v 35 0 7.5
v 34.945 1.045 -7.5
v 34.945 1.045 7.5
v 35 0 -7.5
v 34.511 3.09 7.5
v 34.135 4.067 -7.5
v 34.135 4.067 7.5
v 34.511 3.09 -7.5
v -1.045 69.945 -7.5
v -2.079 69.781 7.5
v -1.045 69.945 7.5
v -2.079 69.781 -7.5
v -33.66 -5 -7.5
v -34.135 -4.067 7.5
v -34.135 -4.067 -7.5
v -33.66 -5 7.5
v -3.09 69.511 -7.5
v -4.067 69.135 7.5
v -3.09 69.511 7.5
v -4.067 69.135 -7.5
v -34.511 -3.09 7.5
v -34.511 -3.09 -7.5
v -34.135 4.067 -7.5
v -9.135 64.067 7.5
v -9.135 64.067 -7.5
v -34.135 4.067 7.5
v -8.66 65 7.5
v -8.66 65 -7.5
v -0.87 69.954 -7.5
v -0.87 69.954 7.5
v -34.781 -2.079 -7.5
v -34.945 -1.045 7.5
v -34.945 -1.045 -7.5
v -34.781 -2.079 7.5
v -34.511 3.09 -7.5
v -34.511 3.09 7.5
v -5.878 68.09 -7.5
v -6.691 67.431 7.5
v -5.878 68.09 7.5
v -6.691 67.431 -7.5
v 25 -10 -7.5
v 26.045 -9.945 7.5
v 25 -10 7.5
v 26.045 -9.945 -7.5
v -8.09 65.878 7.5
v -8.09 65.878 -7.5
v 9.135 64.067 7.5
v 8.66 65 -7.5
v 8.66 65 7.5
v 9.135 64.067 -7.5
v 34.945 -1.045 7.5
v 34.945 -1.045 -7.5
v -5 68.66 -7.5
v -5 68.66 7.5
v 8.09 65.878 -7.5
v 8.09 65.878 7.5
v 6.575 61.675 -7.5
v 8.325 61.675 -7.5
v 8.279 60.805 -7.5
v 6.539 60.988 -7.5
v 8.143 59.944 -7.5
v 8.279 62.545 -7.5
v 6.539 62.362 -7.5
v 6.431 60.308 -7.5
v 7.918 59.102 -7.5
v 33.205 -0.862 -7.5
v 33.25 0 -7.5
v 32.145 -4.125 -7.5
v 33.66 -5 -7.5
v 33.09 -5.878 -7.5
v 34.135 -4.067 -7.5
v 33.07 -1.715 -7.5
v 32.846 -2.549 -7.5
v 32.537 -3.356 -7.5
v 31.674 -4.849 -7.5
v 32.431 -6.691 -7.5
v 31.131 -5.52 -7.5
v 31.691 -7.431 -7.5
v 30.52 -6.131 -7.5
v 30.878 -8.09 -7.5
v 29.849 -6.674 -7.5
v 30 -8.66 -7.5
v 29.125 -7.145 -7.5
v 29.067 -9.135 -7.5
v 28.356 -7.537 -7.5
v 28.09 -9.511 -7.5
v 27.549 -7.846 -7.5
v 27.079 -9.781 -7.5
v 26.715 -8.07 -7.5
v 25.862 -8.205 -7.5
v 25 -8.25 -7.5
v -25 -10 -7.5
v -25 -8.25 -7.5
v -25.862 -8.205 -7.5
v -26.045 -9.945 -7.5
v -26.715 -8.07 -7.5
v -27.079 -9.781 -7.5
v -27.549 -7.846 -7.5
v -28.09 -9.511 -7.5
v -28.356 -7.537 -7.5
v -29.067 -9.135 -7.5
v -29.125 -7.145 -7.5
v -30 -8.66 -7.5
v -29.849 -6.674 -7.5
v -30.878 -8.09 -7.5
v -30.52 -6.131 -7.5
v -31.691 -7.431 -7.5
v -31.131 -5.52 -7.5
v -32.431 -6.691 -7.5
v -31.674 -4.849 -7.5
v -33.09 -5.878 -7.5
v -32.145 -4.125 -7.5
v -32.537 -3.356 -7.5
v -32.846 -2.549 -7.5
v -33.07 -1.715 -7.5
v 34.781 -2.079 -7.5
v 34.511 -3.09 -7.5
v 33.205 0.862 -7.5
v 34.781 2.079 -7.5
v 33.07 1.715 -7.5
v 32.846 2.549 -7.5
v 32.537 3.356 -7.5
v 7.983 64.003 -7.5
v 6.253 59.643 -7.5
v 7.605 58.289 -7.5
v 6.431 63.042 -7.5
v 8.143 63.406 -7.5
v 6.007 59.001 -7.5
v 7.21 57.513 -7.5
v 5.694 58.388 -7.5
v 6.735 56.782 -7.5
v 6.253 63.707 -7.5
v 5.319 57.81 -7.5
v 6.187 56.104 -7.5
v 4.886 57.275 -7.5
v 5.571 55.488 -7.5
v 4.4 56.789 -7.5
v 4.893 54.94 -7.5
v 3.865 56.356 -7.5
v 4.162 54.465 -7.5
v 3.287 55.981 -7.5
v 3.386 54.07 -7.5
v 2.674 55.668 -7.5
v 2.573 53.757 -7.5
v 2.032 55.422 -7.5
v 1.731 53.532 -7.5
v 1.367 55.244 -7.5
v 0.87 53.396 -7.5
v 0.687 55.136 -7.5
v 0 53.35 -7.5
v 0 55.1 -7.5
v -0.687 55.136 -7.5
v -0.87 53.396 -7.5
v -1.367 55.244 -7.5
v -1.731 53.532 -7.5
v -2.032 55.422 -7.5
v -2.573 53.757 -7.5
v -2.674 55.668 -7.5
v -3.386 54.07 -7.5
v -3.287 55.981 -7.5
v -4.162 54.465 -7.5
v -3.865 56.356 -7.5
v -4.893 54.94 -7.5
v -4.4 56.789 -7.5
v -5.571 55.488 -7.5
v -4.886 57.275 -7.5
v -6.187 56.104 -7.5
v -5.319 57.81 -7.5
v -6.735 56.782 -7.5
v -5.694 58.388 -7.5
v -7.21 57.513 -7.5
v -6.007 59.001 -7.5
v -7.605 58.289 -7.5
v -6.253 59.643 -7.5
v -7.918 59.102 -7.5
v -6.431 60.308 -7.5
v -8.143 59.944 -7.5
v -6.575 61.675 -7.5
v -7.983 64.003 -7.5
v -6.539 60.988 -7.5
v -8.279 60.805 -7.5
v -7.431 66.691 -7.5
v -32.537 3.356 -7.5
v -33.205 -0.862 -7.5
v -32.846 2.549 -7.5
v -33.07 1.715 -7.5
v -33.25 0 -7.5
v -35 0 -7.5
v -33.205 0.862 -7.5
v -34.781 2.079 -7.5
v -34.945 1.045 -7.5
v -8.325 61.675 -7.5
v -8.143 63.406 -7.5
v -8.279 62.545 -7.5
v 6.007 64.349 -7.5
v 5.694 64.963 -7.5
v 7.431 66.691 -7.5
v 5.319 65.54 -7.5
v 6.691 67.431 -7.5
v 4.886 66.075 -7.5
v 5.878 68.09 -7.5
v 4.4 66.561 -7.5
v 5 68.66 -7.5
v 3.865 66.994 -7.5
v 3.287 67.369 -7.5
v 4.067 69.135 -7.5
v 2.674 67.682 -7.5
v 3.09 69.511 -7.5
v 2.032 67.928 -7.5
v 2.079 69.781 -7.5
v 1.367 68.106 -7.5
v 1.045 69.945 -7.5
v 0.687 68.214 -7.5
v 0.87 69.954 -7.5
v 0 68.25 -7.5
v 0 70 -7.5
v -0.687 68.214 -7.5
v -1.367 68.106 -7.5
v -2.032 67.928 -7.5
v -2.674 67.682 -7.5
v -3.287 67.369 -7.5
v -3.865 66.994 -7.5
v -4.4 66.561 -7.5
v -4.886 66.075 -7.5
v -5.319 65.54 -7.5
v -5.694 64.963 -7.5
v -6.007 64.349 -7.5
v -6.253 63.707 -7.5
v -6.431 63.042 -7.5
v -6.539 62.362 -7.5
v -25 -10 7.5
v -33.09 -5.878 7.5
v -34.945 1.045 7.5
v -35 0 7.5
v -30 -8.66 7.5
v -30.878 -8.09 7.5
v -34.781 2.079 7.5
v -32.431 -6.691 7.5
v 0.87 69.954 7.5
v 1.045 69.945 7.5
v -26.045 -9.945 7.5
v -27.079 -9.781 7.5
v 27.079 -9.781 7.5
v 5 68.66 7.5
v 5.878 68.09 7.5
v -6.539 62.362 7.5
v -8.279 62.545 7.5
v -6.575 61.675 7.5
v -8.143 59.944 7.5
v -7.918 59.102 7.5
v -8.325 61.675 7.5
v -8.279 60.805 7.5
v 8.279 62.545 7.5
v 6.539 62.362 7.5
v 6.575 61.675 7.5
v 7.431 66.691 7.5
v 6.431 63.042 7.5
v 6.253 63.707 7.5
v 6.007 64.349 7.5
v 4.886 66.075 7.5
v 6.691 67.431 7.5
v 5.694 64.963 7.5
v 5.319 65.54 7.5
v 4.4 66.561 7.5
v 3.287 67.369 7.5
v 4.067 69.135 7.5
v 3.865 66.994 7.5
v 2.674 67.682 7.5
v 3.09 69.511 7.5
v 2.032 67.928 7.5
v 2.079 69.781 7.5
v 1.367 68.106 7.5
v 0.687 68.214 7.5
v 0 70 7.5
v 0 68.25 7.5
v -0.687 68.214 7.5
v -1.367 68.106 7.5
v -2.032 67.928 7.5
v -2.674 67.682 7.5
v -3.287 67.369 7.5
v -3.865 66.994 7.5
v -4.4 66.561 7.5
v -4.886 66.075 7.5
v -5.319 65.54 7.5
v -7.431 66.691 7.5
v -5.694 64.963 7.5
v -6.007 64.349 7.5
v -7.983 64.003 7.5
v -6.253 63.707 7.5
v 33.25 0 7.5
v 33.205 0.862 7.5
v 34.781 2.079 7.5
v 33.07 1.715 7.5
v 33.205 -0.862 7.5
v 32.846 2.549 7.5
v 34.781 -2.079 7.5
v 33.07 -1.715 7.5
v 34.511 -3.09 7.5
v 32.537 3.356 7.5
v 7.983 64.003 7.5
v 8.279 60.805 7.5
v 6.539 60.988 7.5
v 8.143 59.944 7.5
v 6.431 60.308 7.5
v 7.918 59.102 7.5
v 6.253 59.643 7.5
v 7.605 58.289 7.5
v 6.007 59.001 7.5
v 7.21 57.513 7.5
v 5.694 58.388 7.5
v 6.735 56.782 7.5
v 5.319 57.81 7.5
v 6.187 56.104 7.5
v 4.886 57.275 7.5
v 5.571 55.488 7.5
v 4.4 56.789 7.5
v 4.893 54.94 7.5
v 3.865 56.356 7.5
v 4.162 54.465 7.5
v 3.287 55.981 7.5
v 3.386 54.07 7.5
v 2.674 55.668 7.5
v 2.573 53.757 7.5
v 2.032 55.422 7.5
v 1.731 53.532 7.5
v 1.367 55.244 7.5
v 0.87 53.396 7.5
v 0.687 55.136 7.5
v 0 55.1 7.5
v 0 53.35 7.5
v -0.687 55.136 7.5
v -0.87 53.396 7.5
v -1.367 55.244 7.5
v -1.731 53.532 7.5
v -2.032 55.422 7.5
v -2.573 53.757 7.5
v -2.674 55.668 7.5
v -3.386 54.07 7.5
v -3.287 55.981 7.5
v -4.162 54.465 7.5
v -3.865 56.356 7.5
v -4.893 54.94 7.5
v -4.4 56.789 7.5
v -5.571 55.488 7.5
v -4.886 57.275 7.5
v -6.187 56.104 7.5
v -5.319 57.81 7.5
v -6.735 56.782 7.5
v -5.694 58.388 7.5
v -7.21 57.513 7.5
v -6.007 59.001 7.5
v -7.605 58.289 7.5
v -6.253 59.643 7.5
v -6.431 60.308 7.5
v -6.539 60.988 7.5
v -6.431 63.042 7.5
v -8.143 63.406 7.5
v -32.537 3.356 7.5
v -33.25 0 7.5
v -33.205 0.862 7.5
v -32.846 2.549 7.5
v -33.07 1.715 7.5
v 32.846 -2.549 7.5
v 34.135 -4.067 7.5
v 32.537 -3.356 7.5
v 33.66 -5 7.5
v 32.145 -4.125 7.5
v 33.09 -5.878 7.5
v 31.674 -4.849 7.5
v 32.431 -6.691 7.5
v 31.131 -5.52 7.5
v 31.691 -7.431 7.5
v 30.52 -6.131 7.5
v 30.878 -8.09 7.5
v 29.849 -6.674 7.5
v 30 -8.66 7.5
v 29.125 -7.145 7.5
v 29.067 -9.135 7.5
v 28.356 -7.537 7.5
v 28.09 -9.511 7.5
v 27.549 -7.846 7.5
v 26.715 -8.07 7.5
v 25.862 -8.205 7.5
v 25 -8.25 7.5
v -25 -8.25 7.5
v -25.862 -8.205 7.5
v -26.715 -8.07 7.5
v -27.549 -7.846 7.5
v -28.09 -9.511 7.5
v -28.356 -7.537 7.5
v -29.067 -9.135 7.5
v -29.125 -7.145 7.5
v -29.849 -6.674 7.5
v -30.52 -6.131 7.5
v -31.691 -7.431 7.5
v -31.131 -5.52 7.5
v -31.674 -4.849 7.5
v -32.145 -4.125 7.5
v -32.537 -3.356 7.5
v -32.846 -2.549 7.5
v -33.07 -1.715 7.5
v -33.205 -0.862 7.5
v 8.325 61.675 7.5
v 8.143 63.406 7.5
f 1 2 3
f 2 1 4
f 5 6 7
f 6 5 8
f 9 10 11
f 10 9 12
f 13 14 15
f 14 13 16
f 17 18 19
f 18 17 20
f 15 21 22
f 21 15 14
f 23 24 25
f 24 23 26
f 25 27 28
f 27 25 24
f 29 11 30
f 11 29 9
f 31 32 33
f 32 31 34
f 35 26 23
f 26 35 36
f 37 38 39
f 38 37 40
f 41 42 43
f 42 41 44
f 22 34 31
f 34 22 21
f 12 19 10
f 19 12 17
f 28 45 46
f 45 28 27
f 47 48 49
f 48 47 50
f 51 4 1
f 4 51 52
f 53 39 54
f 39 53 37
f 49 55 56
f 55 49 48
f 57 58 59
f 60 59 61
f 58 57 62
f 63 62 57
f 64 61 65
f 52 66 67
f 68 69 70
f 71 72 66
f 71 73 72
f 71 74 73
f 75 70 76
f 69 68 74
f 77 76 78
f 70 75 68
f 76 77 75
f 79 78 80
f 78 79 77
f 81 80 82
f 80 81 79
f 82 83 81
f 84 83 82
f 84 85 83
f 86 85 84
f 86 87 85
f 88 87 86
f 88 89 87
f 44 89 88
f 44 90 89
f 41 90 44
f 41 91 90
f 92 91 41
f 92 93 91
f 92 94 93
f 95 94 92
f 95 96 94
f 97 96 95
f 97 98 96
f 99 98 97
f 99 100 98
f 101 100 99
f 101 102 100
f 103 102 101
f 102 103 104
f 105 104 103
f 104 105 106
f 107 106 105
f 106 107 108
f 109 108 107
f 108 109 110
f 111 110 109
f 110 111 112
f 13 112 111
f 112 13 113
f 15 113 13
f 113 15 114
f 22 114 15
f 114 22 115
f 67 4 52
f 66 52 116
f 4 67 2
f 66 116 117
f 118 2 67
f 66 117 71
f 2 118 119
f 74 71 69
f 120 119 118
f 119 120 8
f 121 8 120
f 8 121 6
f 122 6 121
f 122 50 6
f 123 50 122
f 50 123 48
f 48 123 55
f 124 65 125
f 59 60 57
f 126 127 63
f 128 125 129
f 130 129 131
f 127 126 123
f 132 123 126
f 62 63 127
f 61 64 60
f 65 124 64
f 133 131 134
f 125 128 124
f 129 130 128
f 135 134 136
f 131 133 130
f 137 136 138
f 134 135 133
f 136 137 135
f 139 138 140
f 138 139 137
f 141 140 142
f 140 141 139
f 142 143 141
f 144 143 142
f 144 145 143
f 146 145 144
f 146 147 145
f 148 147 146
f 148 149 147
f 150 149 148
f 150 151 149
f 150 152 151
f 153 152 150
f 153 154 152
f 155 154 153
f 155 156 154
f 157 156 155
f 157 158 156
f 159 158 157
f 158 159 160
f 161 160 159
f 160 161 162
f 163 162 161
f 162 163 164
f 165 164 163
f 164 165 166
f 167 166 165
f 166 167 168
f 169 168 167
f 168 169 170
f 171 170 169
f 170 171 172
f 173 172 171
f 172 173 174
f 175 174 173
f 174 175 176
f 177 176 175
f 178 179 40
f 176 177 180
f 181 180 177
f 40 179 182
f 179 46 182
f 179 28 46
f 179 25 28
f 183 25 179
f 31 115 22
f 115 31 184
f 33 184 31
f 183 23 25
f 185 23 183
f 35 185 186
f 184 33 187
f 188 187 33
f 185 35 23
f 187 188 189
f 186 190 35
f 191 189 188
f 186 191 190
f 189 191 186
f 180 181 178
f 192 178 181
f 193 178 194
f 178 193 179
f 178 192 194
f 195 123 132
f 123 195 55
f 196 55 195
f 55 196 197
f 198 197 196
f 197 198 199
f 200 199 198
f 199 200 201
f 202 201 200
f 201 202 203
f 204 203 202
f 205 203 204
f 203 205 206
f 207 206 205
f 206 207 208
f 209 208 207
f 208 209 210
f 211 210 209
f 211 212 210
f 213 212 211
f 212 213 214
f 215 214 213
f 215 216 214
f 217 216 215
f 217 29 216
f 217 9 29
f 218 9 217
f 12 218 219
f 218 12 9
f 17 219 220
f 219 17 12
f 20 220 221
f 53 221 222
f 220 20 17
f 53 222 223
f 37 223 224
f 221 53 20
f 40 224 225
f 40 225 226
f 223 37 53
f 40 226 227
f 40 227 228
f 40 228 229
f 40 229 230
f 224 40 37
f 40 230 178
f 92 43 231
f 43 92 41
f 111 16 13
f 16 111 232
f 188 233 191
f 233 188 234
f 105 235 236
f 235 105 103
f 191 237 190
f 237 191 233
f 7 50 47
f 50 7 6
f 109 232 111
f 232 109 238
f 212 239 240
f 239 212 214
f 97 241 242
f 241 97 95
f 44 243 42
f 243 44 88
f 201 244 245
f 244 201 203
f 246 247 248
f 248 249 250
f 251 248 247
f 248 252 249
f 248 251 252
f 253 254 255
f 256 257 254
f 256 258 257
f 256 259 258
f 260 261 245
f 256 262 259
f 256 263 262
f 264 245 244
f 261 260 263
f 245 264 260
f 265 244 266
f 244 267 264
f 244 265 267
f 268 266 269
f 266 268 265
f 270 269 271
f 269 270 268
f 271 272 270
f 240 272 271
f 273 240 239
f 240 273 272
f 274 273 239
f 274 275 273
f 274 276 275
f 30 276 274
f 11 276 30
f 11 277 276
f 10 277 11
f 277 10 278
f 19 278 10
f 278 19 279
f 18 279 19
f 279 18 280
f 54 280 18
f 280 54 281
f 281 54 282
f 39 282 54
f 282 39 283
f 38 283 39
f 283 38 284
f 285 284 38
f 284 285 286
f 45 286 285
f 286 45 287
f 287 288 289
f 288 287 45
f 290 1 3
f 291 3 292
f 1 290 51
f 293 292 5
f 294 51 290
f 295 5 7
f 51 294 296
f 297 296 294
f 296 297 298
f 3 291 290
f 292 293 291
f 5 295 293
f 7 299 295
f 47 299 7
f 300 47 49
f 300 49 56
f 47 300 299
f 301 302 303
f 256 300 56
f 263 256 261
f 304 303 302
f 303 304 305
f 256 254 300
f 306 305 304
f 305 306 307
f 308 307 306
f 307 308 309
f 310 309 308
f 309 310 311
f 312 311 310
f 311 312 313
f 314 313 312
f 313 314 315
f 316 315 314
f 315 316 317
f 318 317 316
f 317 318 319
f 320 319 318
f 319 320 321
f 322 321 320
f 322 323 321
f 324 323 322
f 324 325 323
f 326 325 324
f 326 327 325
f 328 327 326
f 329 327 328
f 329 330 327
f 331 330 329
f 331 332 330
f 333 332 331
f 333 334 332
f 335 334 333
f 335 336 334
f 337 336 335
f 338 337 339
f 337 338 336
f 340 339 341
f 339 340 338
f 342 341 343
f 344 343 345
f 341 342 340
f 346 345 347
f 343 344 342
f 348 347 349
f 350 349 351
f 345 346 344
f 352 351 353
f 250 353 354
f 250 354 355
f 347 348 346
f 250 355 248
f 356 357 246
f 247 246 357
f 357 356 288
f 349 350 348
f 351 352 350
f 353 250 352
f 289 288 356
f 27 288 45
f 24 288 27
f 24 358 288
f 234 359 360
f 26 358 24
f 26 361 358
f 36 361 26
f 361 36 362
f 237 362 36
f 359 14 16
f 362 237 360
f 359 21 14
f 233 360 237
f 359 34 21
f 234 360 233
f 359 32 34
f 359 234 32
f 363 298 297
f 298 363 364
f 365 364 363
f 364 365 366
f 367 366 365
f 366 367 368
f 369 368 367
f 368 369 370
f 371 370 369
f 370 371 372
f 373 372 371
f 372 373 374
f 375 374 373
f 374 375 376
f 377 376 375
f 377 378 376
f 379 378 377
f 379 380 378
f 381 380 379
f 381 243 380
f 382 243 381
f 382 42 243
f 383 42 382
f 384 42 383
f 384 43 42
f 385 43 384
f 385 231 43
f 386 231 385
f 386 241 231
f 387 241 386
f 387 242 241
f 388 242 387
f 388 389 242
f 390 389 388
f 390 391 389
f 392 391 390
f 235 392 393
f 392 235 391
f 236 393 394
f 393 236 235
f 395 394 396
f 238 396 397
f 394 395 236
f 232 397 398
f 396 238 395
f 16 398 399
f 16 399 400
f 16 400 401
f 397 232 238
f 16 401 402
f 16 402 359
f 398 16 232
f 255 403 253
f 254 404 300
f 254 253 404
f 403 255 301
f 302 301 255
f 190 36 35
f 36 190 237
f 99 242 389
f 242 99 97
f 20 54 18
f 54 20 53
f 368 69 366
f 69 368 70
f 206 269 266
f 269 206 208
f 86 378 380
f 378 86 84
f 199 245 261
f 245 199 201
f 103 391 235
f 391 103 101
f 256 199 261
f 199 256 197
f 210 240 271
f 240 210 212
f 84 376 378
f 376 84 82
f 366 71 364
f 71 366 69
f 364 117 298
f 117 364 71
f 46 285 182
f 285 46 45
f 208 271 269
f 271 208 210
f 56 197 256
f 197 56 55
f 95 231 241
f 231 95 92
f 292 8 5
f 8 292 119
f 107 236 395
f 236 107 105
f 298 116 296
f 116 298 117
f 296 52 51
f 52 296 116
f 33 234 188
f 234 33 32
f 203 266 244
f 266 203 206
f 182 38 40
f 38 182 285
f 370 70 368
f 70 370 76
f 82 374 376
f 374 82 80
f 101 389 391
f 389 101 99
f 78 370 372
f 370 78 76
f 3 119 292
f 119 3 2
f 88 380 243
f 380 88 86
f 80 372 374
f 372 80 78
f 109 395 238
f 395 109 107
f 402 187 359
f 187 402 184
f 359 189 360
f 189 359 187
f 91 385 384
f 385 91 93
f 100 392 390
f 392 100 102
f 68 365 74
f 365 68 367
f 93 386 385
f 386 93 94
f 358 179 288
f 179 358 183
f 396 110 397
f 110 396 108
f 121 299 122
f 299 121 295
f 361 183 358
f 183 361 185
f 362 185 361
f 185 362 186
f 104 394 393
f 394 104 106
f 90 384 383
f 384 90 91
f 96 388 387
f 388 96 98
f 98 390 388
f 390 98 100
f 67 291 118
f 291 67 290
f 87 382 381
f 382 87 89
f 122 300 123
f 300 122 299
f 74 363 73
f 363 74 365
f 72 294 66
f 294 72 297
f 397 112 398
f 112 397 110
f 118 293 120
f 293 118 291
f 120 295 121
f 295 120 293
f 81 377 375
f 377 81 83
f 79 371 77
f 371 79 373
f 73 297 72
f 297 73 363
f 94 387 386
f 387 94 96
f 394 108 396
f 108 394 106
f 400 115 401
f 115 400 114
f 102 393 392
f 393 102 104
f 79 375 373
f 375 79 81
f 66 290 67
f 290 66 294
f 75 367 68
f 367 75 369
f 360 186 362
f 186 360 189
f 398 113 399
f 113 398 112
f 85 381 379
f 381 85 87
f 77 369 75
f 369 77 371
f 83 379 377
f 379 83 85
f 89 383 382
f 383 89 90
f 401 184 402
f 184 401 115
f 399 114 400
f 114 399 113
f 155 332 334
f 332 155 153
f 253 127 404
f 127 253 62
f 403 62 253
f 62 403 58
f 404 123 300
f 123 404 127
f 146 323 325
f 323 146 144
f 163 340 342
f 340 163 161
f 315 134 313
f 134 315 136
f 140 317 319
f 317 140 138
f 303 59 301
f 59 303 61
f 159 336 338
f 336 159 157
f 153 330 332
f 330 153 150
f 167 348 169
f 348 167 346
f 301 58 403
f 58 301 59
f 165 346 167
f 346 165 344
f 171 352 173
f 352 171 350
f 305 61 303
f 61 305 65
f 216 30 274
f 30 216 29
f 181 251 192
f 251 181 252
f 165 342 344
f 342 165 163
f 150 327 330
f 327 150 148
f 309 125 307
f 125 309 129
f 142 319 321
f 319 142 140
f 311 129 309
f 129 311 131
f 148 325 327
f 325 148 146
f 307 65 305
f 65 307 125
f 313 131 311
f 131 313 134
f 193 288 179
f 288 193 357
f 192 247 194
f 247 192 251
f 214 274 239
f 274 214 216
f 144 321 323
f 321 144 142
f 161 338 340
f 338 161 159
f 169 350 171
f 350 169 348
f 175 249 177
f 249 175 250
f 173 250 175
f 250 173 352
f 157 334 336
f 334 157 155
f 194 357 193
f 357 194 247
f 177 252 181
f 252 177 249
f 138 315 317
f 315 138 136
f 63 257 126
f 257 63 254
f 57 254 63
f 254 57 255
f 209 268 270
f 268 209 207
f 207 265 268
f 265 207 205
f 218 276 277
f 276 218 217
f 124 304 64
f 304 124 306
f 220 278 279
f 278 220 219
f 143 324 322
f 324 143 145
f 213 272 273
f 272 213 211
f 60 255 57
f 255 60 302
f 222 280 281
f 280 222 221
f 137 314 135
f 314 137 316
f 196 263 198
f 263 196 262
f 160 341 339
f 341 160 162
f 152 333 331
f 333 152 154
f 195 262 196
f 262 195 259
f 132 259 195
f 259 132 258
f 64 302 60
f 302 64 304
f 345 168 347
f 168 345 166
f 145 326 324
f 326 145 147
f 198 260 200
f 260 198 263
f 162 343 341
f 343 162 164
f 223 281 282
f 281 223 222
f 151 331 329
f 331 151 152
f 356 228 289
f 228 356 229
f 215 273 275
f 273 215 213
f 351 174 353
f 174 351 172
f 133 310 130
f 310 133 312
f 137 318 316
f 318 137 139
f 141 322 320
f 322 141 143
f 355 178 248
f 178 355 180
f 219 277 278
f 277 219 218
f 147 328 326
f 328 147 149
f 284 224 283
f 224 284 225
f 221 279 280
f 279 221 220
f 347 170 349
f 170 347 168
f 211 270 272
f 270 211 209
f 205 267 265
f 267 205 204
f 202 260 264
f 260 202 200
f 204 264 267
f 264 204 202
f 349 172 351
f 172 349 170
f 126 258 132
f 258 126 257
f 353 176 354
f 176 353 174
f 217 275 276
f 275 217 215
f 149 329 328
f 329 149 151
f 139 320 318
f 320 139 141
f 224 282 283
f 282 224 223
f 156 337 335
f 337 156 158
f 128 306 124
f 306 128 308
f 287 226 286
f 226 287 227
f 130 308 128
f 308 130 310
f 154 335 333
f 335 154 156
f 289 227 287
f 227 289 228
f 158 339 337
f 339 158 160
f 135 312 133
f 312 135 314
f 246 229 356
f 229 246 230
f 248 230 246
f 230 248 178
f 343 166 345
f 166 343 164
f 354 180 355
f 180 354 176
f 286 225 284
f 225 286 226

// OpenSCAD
// Parametric Spool Holder v2
// triangular end pieces that support a dowel
// that holds spools of wire, solder...
// Not really meant for big spools of filament

// preview[view:south, tilt:top]

// the width of the support
width = 70;             //[40:300]

// the height of the support
height = 80;            //[40:300]

//  depth of the support
depth = 15;             //[10:5:50]

// wall thickness of the support
wall = 1.75;            //[.5:.25:3.0]

// radius for rounded corners
cornerRadius = 10;      //[2:1:20]

// radius of dowel
dowelRadius = 6.35;

// extra allowance for dowel
slop = .45;             //[.2:.1:1.5]

/* [Hidden] */
$fn = 60;

insideCornerRadius = cornerRadius-wall;

difference() {
   union() {
      difference() {
         hull() {
            translate([-width/2+cornerRadius, 0, 0])
               cylinder(depth, r=cornerRadius, center=true);
            translate([width/2-cornerRadius, 0, 0])
               cylinder(depth, r=cornerRadius, center=true);
            translate([0, height-2*cornerRadius, 0])
               cylinder(depth, r=cornerRadius, center=true);
         }
         hull() {
            translate([-width/2+insideCornerRadius+wall, 0, 0])
               cylinder(depth, r=insideCornerRadius, center=true);
            translate([width/2-insideCornerRadius-wall, 0, 0])
               cylinder(depth, r=insideCornerRadius, center=true);
            translate([0, height-2*insideCornerRadius-wall, 0])
               cylinder(depth+10, r=insideCornerRadius, center=true);
         }
      }
      translate([0, height-dowelRadius-cornerRadius-wall-slop/2, 0])
         cylinder(depth, r=dowelRadius + slop/2 + wall, center=true);
   }
   translate([0, height-dowelRadius-cornerRadius-wall-slop/2, 0])
      cylinder(depth+10, r=dowelRadius + slop/2, center=true);
}
